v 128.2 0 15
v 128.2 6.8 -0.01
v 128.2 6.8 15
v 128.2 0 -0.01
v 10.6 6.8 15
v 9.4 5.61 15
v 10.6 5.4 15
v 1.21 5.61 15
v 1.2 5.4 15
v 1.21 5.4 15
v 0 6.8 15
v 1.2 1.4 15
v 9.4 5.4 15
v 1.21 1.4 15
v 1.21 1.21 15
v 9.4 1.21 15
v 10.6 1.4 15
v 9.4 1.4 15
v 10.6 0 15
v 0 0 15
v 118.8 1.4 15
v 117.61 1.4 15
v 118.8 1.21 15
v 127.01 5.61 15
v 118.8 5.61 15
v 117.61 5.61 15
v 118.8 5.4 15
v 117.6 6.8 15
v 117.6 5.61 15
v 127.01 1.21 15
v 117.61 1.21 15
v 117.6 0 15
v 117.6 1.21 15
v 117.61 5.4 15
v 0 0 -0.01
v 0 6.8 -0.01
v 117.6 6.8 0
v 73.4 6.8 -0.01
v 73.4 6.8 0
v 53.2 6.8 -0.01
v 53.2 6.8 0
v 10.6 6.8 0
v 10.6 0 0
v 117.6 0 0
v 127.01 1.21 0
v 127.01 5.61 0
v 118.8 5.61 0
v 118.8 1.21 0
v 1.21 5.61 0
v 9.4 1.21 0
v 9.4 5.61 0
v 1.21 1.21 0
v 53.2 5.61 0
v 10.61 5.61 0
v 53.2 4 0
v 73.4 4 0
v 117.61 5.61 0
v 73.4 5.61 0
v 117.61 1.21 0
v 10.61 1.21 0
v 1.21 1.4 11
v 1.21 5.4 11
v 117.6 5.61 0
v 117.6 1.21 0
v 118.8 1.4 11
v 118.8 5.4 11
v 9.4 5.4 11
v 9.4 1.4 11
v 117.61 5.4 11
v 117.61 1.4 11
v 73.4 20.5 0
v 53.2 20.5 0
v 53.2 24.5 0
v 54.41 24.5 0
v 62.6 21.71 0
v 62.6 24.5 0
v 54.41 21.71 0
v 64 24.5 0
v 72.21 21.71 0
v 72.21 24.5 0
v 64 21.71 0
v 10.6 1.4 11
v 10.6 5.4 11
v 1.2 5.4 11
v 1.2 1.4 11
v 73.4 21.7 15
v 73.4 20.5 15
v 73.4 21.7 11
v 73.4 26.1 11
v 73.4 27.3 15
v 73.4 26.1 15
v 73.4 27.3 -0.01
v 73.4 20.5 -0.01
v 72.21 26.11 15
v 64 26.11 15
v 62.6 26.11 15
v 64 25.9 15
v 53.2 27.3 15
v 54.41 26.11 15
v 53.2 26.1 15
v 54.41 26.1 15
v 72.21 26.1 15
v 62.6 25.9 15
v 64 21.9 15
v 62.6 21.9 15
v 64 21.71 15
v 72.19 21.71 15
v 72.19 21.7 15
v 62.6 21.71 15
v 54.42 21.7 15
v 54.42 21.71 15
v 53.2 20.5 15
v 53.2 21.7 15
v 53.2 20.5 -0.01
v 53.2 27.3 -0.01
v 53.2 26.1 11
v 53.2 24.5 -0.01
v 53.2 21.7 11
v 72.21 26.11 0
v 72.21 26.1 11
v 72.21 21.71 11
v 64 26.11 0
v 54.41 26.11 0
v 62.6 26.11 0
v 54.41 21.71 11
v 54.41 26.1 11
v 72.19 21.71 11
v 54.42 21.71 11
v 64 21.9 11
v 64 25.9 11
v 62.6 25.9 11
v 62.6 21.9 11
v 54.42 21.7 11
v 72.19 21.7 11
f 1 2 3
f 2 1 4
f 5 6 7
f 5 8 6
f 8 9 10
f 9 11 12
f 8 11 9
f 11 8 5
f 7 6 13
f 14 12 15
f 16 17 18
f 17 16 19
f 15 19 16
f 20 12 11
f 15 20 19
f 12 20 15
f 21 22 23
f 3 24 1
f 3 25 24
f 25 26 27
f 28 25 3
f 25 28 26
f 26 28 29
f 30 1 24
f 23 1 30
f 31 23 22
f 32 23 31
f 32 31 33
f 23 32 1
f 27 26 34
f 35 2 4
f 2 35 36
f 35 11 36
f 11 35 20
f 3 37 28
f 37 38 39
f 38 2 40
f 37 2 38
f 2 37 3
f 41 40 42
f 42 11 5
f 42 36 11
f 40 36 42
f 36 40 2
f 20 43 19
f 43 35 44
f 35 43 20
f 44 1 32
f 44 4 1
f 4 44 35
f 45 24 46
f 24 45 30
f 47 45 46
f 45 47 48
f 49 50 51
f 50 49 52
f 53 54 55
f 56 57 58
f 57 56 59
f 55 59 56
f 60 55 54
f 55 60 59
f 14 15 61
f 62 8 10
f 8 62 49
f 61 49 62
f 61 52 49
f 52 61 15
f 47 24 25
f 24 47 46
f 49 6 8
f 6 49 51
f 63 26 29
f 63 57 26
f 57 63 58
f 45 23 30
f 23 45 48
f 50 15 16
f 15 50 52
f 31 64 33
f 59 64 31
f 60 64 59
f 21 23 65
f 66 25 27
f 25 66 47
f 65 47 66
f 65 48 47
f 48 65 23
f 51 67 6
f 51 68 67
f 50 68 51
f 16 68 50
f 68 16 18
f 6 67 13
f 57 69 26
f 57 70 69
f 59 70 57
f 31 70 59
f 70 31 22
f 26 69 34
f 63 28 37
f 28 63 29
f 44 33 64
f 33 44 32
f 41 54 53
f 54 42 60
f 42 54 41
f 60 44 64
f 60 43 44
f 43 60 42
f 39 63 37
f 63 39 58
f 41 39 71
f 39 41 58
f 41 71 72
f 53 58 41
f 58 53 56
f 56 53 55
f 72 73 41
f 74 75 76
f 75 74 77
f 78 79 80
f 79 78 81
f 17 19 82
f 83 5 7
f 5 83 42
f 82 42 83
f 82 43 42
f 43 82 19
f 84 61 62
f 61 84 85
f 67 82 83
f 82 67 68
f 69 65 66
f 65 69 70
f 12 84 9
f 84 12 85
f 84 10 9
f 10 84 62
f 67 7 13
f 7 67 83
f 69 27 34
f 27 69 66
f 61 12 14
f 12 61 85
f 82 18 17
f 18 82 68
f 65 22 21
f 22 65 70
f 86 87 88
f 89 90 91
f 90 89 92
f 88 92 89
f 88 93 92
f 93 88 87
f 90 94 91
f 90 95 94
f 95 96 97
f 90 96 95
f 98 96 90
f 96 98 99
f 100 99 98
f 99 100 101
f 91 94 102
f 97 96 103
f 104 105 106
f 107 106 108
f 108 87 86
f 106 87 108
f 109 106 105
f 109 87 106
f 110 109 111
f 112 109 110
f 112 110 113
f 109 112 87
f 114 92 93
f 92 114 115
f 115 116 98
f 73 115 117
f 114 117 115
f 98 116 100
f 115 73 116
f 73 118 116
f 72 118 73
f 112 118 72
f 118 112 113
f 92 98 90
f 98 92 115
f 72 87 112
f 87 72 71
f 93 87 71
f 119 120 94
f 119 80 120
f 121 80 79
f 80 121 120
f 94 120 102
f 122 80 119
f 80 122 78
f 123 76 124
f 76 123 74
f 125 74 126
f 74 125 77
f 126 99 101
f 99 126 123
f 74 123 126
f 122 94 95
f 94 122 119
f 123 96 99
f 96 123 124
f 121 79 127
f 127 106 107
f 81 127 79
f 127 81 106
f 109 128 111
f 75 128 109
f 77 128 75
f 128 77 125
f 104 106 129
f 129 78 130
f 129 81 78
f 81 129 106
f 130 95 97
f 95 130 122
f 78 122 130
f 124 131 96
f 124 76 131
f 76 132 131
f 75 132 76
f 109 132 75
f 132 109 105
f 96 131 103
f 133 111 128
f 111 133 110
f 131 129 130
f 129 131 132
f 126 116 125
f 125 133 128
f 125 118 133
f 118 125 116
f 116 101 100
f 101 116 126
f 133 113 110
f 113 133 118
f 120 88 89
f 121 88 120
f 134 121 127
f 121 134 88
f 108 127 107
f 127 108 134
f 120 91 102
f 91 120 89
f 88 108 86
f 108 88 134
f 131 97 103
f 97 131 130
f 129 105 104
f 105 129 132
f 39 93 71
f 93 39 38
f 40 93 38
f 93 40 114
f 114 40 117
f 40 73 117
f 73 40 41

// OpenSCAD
// file: ../Base/Rotation.scad
// Fischertechnik Box Foundation
// Geometry Helpers Rotation

include <PlacementOptions.scad>

// getRotatedSpace(space, rotation=NoRotation)
// Rotates the space dependent on the specified rotation

function getRotatedSpace(space, rotation=NoRotation) = [
    (rotation == Rotate90 || rotation == Rotate270) ? space.y : space.x,
    (rotation == Rotate90 || rotation == Rotate270) ? space.x : space.y
];

// Rotates the given space around the fixed left lower corner
// space = the space the children needs as width/depth list [width,depth]
// rotation = 0 Rotate0 degrees, 1 Rotate90 degrees, 2 Rotate180 degrees, 3 Rotate270 degrees (equivalent to -90)

module RotateFix(space, rotation=NoRotation) {
    dy = (rotation == Rotate0 || rotation == Rotate270) ? 0 :
        (rotation == Rotate90) ? space.x :
        space.y;
    dx = (rotation < Rotate180) ? 0 :
        (rotation == Rotate180) ? space.x :
        space.y;
    
    translate([dx, dy, 0])
        rotate([0, 0, rotations[rotation]])
            children();
}
// file: ../Base/Alignment.scad
// Fischertechnik Box Foundation
// Geometry Helpers Alignment

include <PlacementOptions.scad>

// getAlignedX(elementWidth, spaceWidth, align=AlignRight, offset=0)
// Gets the aligned X offset of an element with the given
// width in the given space.
// elementWidth = The width of the element to positon
// spaceWidth = The space where the element should be aligned
// align = 0 AlignLeft, 1 AlignCenter, 2 AlignRight
// offset = an optional offset from the aligned position. When
// aligned left or centered, then positive values are in X direction.
// When aligned right then positive values are in negative X direction.

function getAlignedX(elementWidth, spaceWidth, align=AlignRight, offset=0) =
    (align == AlignLeft) ?
        offset :
        ((align == AlignCenter) ?
        (spaceWidth - elementWidth)/2 + offset :
        spaceWidth - offset - elementWidth);

// getAlignedY(elementDepth, spaceDepth, align=AlignTop, offset=0)
// Gets the aligned Y offset of an element with the given
// depth in the given space.
// elementDepth = The depth of the element to positon
// spaceDepth = The space where the element should be aligned
// align = 0 AlignBottom, 1 AlignCenter, 2 AlignTop
// offset = an optional offset from the aligned position. When
// aligned bottom or centered, then positive values are in Y direction.
// When aligned top then positive values are in negative Y direction.

function getAlignedY(elementDepth, spaceDepth, align=AlignTop, offset=0) =
    (align == AlignBottom) ?
        offset :
        ((align == AlignCenter) ?
        (spaceDepth - elementDepth)/2 + offset :
        spaceDepth - offset - elementDepth);
// file: ../Base/PlacementOptions.scad
// Fischertechnik Box Foundation
// Placement Options

// Alignment
NoAlign = 0;
AlignLeft = 1;
AlignBottom = 2;
AlignCenter = 3;
AlignRight = 4;
AlignTop = 5;

// Element rotation degree steps
rotations = [0, -90, -180, -270];

// Rotation
NoRotation = 0;
Rotate0 = 0;
Rotate90 = 1;
Rotate180 = 2;
Rotate270 = 3;

// Docking (seen from above)
NoDock = -1;
DockLeft = 0;
DockTop = 1;
DockRight = 2;
DockCorner = 2;
DockBottom = 3;

// Web corners
LowerLeft = 0;
UpperLeft = 1;
UpperRight = 2;
LowerRight = 3;

// Web position relative to corner
LeftOfCorner = 0;
RightOfCorner = 1;
// file: ../Base/Boxes.scad
// Fischertechnik Box Foundation
// Pre-designed Boxes

use <Constants.scad>

include <PlacementOptions.scad>

box190Width = 190;
box190Depth = 130;
box130Width = 130;
box130Depth = 95;

// Values are from an original ec3 box
topBottomDifference = 1.5;
outerHeight = 40;
baseThickness = 1.8;
innerHeight = outerHeight - baseThickness;
stackExcess = 5.7;
radius = 3.5;
wallThickness = 1.5;
tolerance = 0.2;

boxWallThickness = wallThickness;
boxBaseThickness = baseThickness;
boxWebWidth = 3.0;

// getBoxWallThickness()
// Gets the wall thickness of a Fischertechnik Box
function getBoxWallThickness() = boxWallThickness;

// getBoxUsageHeight(height = 38.2)
// Gets the usable height of a Fischertechnik box
// height = Outer height of the box from the bottom to the upper edge.
function getBoxUsageHeight(height = outerHeight) = height - baseThickness - stackExcess;

// getBoxInnerHeight()
// Gets the inner height of a Fischertechnik box, including the stack excess
function getBoxInnerHeight() = innerHeight;

// getBoxBaseThickness()
// Gets the thickness of the Fischertechnik box base.
function getBoxBaseThickness() = boxBaseThickness;

// getBoxWebWidth()
// Gets the width of a box web
function getBoxWebWidth() = boxWebWidth;

// getBox190Space()
// Gets the usable inner space of a Box 190 as an x/y-list
function getBox190Space() = [
    box190Width - 2*getBoxWallThickness() - topBottomDifference, 
    box190Depth - 2*getBoxWallThickness() - topBottomDifference ];

// RoundedCornerPlate(width, depth, height, radius)
// Creates a body plate with rounded corners for a box. Used
// also to create the complete box with the hull module.
// width = Width of the plate
// depth = depth of the plate 
// height = thickness of the plate
// radius = radius of the rounded corner
module RoundedCornerPlate(width, depth, height, radius) {
    translate([radius, radius])
    hull() {
        w = width-2*radius;
        d = depth-2*radius;
        cube([w, d, height]);
        cylinder(height, r=radius, $fn=getFragments());
        translate([w, 0])
            cylinder(height, r=radius, $fn=getFragments());
        translate([w, d])
            cylinder(height, r=radius, $fn=getFragments());
        translate([0, d])
            cylinder(height, r=radius, $fn=getFragments());
    }
}

// BoxBase(width, depth)
// Creates an empty stackable Fischertechnik compatible box
// width = Outer width of the box (190, 130, ...)
// depth = Outer depth of the box (130, 95, ...)

module BoxBase(width, depth, height=outerHeight) {    
    thinPlate = 0.01;

    innerHeight = height - baseThickness;    
    
    module Body(tolerance=tolerance) {
        hull() {
            // Bottom with tolerance to fit into the original boxes when stacked
            translate([-wallThickness+tolerance, -wallThickness+tolerance, -baseThickness])
                RoundedCornerPlate(width-topBottomDifference-2*tolerance, depth-topBottomDifference-2*tolerance, thinPlate, radius);
            
            // Top
            translate([-wallThickness-topBottomDifference/2, -wallThickness-topBottomDifference/2, innerHeight-thinPlate])
                RoundedCornerPlate(width, depth, thinPlate, radius);
         }
    }

    module Cutoff() {
        hull() {
            coWidth = width - 2*wallThickness;
            coDepth = depth - 2*wallThickness;
            
            // Bottom
            RoundedCornerPlate(coWidth-topBottomDifference, coDepth-topBottomDifference, thinPlate, radius);

            // Top
            translate([-topBottomDifference/2, -topBottomDifference/2, innerHeight+thinPlate]) 
                RoundedCornerPlate(coWidth, coDepth, thinPlate, radius);
        }
    }
    
    difference() {        
        Body();
        Cutoff();
        stackOffset = innerHeight - stackExcess;
        translate([0, 0, stackOffset + baseThickness])
            Body(tolerance=0);
    }
}

// Creates the Fischertechnik empty box 130x190 mm and places it at position 0,0
// 190x130 are the outer sizes, the inner space is slightly smaller. Use getBox190Space() to get the inner sizes.
// The box is positioned that the usable inner space is at the 0,0,0 position.

module Box190() {
    BoxBase(box190Width, box190Depth);
}

// Gets the usable inner space of a Box 130 as an x/y-list
function getBox130Space() = [
    box130Width - 2*getBoxWallThickness() - topBottomDifference, 
    box130Depth - 2*getBoxWallThickness() - topBottomDifference ];

// Creates the Fischertechnik empty box 95x130 mm and places it at position 0,0
// 190x130 are the outer sizes, the inner space is slightly smaller. Use getBox190Space() to get the inner sizes.
// The box is positioned that the usable inner space is at the 0,0,0 position.

module Box130() {
    BoxBase(box130Width, box130Depth);
}

// Creates a web at the specified box walls
// corner 0 = LowerLeft, 1 = UpperLeft, 2 = UpperRight, 3 = LowerRight
// side 0 = LeftOfCorner, 1 = RightOfCorner
// distance = Distance in mm from the corner
// boxSpace = inner width and depth of the box (default: Box 190)
// webWidth = length of the web (default is 3 mms)
// webThickness = thickness of the web (default is 1 mm)
// height = Height of the web (standard is getBoxUsageHeight())
// sink = How much of the web is sunk into the wall

module BoxWeb(
    corner, 
    side, 
    distance, 
    boxSpace=getBox190Space(), 
    webWidth=getBoxWebWidth(), 
    webThickness=1.0, 
    height=getBoxUsageHeight(),
    sink = getBoxWallThickness()/2) {
    width = (corner % 2 == 0) ? 
            (side == LeftOfCorner ? webWidth : webThickness) :
            (side == LeftOfCorner ? webThickness : webWidth);

    depth = (corner % 2 == 0) ? 
            (side == RightOfCorner ? webWidth : webThickness) :
            (side == RightOfCorner ? webThickness : webWidth);
    
    xDiff = corner == LowerLeft ? 
                (side == LeftOfCorner ? -sink : distance) :
            (corner == UpperLeft ?                
                (side == LeftOfCorner ? distance : -sink) :
            (corner == UpperRight ?
                (side == LeftOfCorner ? boxSpace.x-webWidth+sink : boxSpace.x-distance-webThickness) :
                (side == LeftOfCorner ? boxSpace.x-distance-webThickness: boxSpace.x-webWidth+sink)));

    yDiff = corner == LowerLeft ? 
                (side == RightOfCorner ? -sink : distance) :
            (corner == UpperLeft ?
                (side == RightOfCorner ? boxSpace.y-distance-webThickness : boxSpace.y-webWidth+sink) :
            (corner == UpperRight ?
                (side == RightOfCorner ? boxSpace.y-webWidth+sink : boxSpace.y-distance-webThickness) :
                (side == RightOfCorner ? distance : -sink)));
    
    translate([xDiff, yDiff, -getExcess()])
        cube([width, depth, height + 2*getExcess()]);
}
// file: ../Base/Placement.scad
// Fischertechnik Box Foundation
// Geometry Helpers Placement

use <Constants.scad>
use <Alignment.scad>
use <Rotation.scad>
use <Boxes.scad>

include <PlacementOptions.scad>

// Place(x=0, y=0, elementSpace=[0,0], alignX=AlignLeft, alignY=AlignBottom, rotation=Rotate0, boxSpace=getBox190Space())
// Places the child at the specified position
// y = Y-Position. This is a relative position when an X aligment is specified.
// x = X-Position. This is a relative position when an Y aligment is specified.
// elementSpace = space of the element to be placed [x,y]
// alignX = -1=NoAlign, 0 AlignLeft, 1 AlignCenter, 3 AlignRight (elementSpace and boxSpace required!)
// alignY = -1=NoAlign, 2 AlignBottom, 1 AlignCenter, 4 AlignTop (elementSpace and boxSpace required!)
// rotation = 0 Rotate0 0 degrees, 1 Rotate90 90 degrees, 
// 2 Rotate180 180 degrees, 3 Rotate270 270 degrees (equivalent to -90)
// boxSpace = Inner space of the box where the placement occurs [x,y] - default is Box 190x130 inner space

module Place(x=0, y=0, elementSpace=[0,0], 
  alignX=AlignLeft, alignY=AlignBottom, 
  rotation=NoRotation, boxSpace=getBox190Space()) {

    module Position(x, y, space, rotation=Rotate0) {
        translate([x, y, 0])
            RotateFix(space, rotation)
                children();
    }

    space = getRotatedSpace(elementSpace, rotation);
    alignedX = getAlignedX(space.x, boxSpace.x, alignX, x);
    alignedY = getAlignedY(space.y, boxSpace.y, alignY, y);
    Position(alignedX, alignedY, elementSpace, rotation)
        children();
}

// Center(space=getBox130Space(), elementSpace=[0,0])
// space = Space where the children is centered. For cylinder use centered=true and no elementSpace.
// elementSpace = space of the element to be centered [x,y]

module Center(space=getBox190Space(), elementSpace=[0,0]) {
    Place(elementSpace=elementSpace, boxSpace=space, alignX=AlignCenter, alignY=AlignCenter)
        children();
}

// CenterHorizontal(width=0, y=0, offset=0, space=getBox130Space())
// width = Width of the element to be placed.
// y = Y position of the element
// offset = Offset from the center position (negative will be left of the center)
// space = Space where the element is placed

module CenterHorizontal(width=0, y=0, offset=0, space=getBox190Space()) {
    Place(x=offset, y=y, elementSpace=[width, 0], boxSpace=space, alignX=AlignCenter)
        children(0);
}

// CenterVertical(depth=0, x=0, offset=0, space=getBox130Space())
// depth = Depth of the element to be placed.
// x = X position of the element
// offset = Offset from the center position (negative will be down of the center)
// space = Space where the element is placed

module CenterVertical(depth=0, x=0, offset=0, space=getBox190Space()) {
    Place(x=x, y=offset, elementSpace=[0, depth], boxSpace=space, alignY=AlignCenter)
        children(0);
}

// getIsVertical(align)
// True if the specified alignment needs a vertical orientation for a divider (AlignRight, AlignLeft)

function getIsVertical(align) = (align == AlignRight || align == AlignLeft);

// getIsHorizontal(align)
// True if the specified alignment needs a horizontal orientation for a divider (AlignTop, AlignBottom)

function getIsHorizontal(align) = (align == AlignTop || align == AlignBottom);
// file: ../Base/Constants.scad
// Fischertechnik Box Foundation
// Constants

// Constant values necessary for multiple elements

// Base constants
dividerThickness = 1.2;
excess = 0.01;
fragments = 90;
tolerance = 0.8;

// Gets the thickness of a divider 
function getDividerThickness() = dividerThickness;

// Gets the excess that is used to merge walls into each other
function getExcess() = excess;

// Gets amount of fragments of a cylinder
function getFragments() = fragments;

// Gets the inner tolerance of a frame to each side
function getTolerance() = tolerance;


// Fischertechnik specific constants
axisDiameter = 4;
axisBottomDiameter = axisDiameter + 1;
axisTolerance = 0.2;

// Gets axis diameter of Fischertechnik axis
function getAxisDiameter() = axisDiameter;

// Gets axis diameter tolerance (subtracted for element axis)
function getAxisTolerance() = axisTolerance;

// Gets the axis diameter for standing axis
function getStandAxisDiameter() = getAxisDiameter() - getAxisTolerance();

// Gets axis bottom diameter for thicker part at the bottom
function getAxisBottomDiameter() = axisBottomDiameter;

pinHeight = 2.5;

// gets the height of a connecting pin
function getPinHeight() = pinHeight;

standardEdgeDistance = 2.5;
standardWebDistance = 11.5;
standardCornerLength = 15;

// gets the standard distance to the wall of the box for dockable frames with webs
function getStandardEdgeDistance() = standardEdgeDistance;

// gets the standard distance of each web to the corner of the dockable frame
function getStandardWebDistance() = standardWebDistance;

// gets the standard length of the corner walls of a dockable frame
function getStandardCornerLength() = standardCornerLength;

tubeWallFactor = 0.8;

// gets the wall thickness of a tube.
function getTubeWallThickness() = tubeWallFactor * getDividerThickness();

smallPartsFrameHeight = 20;

// gets the frame height for docked small parts boxes.
function getSmallPartsFrameHeight() = smallPartsFrameHeight;

hubRingDiameter = 19.5;
hubRingLevelDiameter = 21;

// gets the diameter of a tube matching the inner ring of a wheel
function getHubRingDiameter() = hubRingDiameter;

// gets the diameter of a hub tube with a thicker diameter
function getHubRingLevelDiameter() = hubRingLevelDiameter;
// main file
// Fischertechnik Box Library
// Frame for single Cranked Axis
// 31080

use <../Base/Constants.scad>
use <../ModelBase/Simple.scad>
use <../ModelBase/Complex.scad>

/* [Hidden] */
length = 125;
holderOffset = 20.5;

// getFrameCrankedAxisSpace()
// Gets the space (.x, .y) the holder for the cranked axis needs

function getFrameCrankedAxisSpace() = [getFrameAxisSpace(length).x, holderOffset + getFrameAxisSpace(length).y];

// FrameCrankedAxis()
// Holder for a single cranked axis

module FrameCrankedAxis() {
    FrameAxis(length);
    
    holderLength = 17 + 2*getDividerThickness();
    xOffset = ((length + getTolerance()) - holderLength)/2;
    yOffset = getAxisDiameter();

    spaceWidth = holderLength + getTolerance();
    
    translate([xOffset, yOffset, 0]) {
        Space([spaceWidth, holderOffset]);
    }
    
    translate([xOffset, holderOffset, 0]) {
        FrameAxis(holderLength, true);
    }
}

// Tests
color("lightgray") {
FrameCrankedAxis();
}
